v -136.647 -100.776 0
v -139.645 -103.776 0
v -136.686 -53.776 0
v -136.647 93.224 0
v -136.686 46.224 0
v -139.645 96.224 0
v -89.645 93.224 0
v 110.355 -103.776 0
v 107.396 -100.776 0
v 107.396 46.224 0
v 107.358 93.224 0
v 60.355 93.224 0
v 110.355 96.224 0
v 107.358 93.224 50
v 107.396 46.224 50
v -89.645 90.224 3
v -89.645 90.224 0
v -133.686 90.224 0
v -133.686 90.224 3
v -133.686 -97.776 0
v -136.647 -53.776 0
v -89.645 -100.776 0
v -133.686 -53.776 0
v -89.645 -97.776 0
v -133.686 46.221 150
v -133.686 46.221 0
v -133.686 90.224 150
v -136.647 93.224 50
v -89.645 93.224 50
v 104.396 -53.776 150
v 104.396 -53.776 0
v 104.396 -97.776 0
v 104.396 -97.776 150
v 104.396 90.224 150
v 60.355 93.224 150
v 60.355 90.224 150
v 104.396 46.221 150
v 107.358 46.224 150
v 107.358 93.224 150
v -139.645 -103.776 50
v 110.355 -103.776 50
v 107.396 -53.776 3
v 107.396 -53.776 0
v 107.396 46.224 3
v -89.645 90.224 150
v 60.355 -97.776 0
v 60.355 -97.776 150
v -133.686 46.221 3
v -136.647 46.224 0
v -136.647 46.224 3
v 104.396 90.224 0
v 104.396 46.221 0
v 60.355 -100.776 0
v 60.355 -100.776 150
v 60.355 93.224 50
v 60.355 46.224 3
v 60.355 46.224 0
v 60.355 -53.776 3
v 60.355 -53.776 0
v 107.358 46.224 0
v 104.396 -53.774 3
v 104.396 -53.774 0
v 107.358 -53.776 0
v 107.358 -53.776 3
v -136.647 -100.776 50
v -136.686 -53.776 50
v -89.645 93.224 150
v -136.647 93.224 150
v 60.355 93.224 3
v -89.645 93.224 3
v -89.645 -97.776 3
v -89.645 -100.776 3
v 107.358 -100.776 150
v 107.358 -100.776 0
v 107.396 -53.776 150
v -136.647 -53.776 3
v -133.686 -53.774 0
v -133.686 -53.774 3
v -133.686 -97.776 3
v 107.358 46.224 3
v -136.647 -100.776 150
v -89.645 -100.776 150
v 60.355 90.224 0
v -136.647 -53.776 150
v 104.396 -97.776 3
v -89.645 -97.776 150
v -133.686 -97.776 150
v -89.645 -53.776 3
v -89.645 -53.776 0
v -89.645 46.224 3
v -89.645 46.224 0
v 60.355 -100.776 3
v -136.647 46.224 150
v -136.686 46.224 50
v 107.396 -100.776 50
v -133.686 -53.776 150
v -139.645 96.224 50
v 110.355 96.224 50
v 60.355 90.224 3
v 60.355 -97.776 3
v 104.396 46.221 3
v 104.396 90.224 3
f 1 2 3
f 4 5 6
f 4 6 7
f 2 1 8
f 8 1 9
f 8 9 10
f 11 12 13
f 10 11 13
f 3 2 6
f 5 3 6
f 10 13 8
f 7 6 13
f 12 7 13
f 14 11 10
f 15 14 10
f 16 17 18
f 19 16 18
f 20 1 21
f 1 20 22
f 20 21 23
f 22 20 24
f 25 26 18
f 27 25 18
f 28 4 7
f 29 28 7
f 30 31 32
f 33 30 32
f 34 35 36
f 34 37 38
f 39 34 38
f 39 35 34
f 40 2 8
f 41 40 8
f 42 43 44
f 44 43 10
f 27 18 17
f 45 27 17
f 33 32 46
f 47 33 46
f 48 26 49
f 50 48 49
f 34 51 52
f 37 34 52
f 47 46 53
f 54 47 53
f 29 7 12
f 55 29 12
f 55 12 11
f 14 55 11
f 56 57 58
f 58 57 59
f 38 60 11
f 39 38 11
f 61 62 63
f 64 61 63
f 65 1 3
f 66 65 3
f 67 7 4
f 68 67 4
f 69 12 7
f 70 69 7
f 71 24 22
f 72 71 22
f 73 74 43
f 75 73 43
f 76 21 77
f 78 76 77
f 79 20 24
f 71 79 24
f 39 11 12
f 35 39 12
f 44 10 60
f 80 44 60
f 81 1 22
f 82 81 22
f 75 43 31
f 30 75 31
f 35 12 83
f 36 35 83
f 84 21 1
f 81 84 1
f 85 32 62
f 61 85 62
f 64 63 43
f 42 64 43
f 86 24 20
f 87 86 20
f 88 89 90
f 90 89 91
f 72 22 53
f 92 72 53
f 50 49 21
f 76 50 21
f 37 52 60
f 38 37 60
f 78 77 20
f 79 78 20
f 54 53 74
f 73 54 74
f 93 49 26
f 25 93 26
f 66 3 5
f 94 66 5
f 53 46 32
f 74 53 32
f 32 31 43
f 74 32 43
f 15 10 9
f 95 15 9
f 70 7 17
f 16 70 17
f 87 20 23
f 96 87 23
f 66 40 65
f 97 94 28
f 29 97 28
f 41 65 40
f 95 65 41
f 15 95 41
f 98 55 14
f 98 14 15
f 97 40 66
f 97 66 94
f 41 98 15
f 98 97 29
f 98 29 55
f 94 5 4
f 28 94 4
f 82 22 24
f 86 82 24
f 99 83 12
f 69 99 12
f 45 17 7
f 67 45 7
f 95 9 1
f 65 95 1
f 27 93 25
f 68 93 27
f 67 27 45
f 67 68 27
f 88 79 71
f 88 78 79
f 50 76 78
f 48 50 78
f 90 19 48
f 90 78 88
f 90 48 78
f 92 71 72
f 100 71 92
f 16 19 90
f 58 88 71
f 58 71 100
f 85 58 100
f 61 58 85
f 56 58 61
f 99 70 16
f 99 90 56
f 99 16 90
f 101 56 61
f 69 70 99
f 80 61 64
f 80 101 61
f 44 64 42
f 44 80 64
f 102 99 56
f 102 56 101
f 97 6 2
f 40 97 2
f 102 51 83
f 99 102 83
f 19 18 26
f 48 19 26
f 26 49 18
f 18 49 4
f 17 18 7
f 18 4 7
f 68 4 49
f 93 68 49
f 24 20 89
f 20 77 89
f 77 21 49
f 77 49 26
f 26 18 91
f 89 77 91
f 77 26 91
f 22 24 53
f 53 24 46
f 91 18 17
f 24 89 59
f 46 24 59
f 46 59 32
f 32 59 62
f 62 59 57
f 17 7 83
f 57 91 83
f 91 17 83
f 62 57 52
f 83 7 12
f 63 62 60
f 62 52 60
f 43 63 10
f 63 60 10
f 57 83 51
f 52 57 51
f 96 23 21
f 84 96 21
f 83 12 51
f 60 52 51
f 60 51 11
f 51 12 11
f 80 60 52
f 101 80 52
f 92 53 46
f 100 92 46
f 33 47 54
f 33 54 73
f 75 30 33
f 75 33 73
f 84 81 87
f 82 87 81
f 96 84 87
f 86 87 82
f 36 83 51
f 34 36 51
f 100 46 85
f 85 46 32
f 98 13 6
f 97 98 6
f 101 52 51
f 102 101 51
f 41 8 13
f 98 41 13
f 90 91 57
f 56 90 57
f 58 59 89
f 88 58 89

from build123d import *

# Parameters (mm, degrees)
F1_DEPTH = 150
F2_DEPTH = 150
F3_DEPTH = 50
F0_W     = 44.041014101
F0_H     = 44.0000000126
F4_DEPTH = 3


# Not quite as in the source:
# - ends of sketch curves that miss each other by under 0.0002 mm in the source are joined


with BuildPart() as f1:
    # F0 (on Top) → F1 (new body)
    with BuildSketch(Plane.XY):
        Polygon((-133.6856555302, 90.2236848028), (-89.6446414292, 90.2236848154), (-89.6446414292, 93.2236848154), (-136.6471022147, 93.2236848019), (-136.6471022147, 46.2236531798), (-133.6856555302, 46.2212240181), align=None)
    extrude(amount=F1_DEPTH)


with BuildPart() as f2:
    # F0 (on Top) → F2 (new body)
    with BuildSketch(Plane.XY):
        Polygon((60.3553585708, 93.2236848154), (60.3553585708, 90.2236848154), (104.3963726718, 90.2236848028), (104.3963726718, 46.2212240181), (107.3578193563, 46.2236531798), (107.3578193563, 93.2236848019), align=None)
    extrude(amount=F2_DEPTH)


with BuildPart() as f2b:
    # F0 (on Top) → F2, piece 2 (new body)
    with BuildSketch(Plane.XY):
        Polygon((107.3578193563, -53.7763151981), (104.3963726718, -53.7763151981), (104.3963726718, -97.7763151981), (60.3553585708, -97.7763152106), (60.3553585708, -100.7763152106), (107.3578193563, -100.7763151981), (107.3963716626, -53.7763151981), align=None)
    extrude(amount=F2_DEPTH)


with BuildPart() as f2c:
    # F0 (on Top) → F2, piece 3 (new body)
    with BuildSketch(Plane.XY):
        Polygon((-89.6446414292, -100.7763152106), (-89.6446414292, -97.7763152106), (-133.6856555302, -97.7763151981), (-133.6856555302, -53.7763151981), (-136.6471022147, -53.7763151981), (-136.6471022147, -100.7763151981), align=None)
    extrude(amount=F2_DEPTH)


with BuildPart() as f3:
    # F0 (on Top) → F3 (new body)
    with BuildSketch(Plane.XY):
        Polygon((-89.6446414292, 96.2236848019), (-136.6446414292, 96.2236848019), (-139.6446414292, 96.2236848019), (-139.6446414292, 46.2236848019), (-139.6446414292, -3.7763151976), (-139.6446414292, -103.7763151981), (110.3553585708, -103.7763151981), (110.3553585708, -53.7763151981), (110.3553585708, 96.2236848019), (60.3553585708, 96.2236848019), (-14.6446414292, 96.2236848019), align=None)
        Polygon((-136.6471022147, 93.2236848019), (-89.6446414292, 93.2236848154), (60.3553585708, 93.2236848154), (107.3578193563, 93.2236848019), (107.3963716626, 46.2236848019), (107.3963716626, -53.7763151981), (107.3963716626, -100.7763151981), (107.3578193563, -100.7763151981), (60.3553585708, -100.7763151981), (-89.6446414292, -100.7763151981), (-136.6471022147, -100.7763151981), (-136.685654521, -53.7763151981), (-136.685654521, 46.2236848028), align=None, mode=Mode.SUBTRACT)
    extrude(amount=F3_DEPTH)


with BuildPart() as f4:
    # F0 (on Top) → F4 (new body)
    with BuildSketch(Plane.XY):
        with Locations((-111.6651484797, -75.7763152043)):
            Rectangle(F0_W, F0_H)
        Polygon((-89.6446414292, -53.7763151981), (-89.6446414292, 46.2236848019), (-89.6446414292, 90.2236848154), (-133.6856555302, 90.2236848028), (-133.6856555302, 46.2212240181), (-136.6471022147, 46.2236531798), (-136.6471022147, -53.7763151981), (-133.6856555302, -53.7738544134), (-133.6856555302, -53.7763151981), align=None)
        Polygon((60.3553585708, -53.7763151981), (-89.6446414292, -53.7763151981), (-89.6446414292, -97.7763152106), (-89.6446414292, -100.7763152106), (60.3553585708, -100.7763151981), (60.3553585708, -97.7763152106), (104.3963726718, -97.7763151981), (104.3963726718, -53.7763151981), align=None)
        Polygon((60.3553585708, 90.2236848154), (60.3553585708, 46.2236848019), (60.3553585708, -53.7763151981), (104.3963726718, -53.7763151981), (104.3963726718, -53.7738544134), (107.3578193823, -53.7762835751), (107.3963716626, -53.7763151981), (107.3963716626, 46.2236848019), (107.3578193563, 46.2236531798), (104.3963726718, 46.2212240181), (104.3963726718, 90.2236848028), align=None)
        Polygon((-89.6446414292, 90.2236848154), (-89.6446414292, 46.2236848019), (60.3553585708, 46.2236848019), (60.3553585708, 90.2236848154), (60.3553585708, 93.2236848154), (-89.6446414292, 93.2236848154), align=None)
    extrude(amount=F4_DEPTH)


solid = Compound([f1.part, f2.part, f2b.part, f2c.part, f3.part, f4.part])
